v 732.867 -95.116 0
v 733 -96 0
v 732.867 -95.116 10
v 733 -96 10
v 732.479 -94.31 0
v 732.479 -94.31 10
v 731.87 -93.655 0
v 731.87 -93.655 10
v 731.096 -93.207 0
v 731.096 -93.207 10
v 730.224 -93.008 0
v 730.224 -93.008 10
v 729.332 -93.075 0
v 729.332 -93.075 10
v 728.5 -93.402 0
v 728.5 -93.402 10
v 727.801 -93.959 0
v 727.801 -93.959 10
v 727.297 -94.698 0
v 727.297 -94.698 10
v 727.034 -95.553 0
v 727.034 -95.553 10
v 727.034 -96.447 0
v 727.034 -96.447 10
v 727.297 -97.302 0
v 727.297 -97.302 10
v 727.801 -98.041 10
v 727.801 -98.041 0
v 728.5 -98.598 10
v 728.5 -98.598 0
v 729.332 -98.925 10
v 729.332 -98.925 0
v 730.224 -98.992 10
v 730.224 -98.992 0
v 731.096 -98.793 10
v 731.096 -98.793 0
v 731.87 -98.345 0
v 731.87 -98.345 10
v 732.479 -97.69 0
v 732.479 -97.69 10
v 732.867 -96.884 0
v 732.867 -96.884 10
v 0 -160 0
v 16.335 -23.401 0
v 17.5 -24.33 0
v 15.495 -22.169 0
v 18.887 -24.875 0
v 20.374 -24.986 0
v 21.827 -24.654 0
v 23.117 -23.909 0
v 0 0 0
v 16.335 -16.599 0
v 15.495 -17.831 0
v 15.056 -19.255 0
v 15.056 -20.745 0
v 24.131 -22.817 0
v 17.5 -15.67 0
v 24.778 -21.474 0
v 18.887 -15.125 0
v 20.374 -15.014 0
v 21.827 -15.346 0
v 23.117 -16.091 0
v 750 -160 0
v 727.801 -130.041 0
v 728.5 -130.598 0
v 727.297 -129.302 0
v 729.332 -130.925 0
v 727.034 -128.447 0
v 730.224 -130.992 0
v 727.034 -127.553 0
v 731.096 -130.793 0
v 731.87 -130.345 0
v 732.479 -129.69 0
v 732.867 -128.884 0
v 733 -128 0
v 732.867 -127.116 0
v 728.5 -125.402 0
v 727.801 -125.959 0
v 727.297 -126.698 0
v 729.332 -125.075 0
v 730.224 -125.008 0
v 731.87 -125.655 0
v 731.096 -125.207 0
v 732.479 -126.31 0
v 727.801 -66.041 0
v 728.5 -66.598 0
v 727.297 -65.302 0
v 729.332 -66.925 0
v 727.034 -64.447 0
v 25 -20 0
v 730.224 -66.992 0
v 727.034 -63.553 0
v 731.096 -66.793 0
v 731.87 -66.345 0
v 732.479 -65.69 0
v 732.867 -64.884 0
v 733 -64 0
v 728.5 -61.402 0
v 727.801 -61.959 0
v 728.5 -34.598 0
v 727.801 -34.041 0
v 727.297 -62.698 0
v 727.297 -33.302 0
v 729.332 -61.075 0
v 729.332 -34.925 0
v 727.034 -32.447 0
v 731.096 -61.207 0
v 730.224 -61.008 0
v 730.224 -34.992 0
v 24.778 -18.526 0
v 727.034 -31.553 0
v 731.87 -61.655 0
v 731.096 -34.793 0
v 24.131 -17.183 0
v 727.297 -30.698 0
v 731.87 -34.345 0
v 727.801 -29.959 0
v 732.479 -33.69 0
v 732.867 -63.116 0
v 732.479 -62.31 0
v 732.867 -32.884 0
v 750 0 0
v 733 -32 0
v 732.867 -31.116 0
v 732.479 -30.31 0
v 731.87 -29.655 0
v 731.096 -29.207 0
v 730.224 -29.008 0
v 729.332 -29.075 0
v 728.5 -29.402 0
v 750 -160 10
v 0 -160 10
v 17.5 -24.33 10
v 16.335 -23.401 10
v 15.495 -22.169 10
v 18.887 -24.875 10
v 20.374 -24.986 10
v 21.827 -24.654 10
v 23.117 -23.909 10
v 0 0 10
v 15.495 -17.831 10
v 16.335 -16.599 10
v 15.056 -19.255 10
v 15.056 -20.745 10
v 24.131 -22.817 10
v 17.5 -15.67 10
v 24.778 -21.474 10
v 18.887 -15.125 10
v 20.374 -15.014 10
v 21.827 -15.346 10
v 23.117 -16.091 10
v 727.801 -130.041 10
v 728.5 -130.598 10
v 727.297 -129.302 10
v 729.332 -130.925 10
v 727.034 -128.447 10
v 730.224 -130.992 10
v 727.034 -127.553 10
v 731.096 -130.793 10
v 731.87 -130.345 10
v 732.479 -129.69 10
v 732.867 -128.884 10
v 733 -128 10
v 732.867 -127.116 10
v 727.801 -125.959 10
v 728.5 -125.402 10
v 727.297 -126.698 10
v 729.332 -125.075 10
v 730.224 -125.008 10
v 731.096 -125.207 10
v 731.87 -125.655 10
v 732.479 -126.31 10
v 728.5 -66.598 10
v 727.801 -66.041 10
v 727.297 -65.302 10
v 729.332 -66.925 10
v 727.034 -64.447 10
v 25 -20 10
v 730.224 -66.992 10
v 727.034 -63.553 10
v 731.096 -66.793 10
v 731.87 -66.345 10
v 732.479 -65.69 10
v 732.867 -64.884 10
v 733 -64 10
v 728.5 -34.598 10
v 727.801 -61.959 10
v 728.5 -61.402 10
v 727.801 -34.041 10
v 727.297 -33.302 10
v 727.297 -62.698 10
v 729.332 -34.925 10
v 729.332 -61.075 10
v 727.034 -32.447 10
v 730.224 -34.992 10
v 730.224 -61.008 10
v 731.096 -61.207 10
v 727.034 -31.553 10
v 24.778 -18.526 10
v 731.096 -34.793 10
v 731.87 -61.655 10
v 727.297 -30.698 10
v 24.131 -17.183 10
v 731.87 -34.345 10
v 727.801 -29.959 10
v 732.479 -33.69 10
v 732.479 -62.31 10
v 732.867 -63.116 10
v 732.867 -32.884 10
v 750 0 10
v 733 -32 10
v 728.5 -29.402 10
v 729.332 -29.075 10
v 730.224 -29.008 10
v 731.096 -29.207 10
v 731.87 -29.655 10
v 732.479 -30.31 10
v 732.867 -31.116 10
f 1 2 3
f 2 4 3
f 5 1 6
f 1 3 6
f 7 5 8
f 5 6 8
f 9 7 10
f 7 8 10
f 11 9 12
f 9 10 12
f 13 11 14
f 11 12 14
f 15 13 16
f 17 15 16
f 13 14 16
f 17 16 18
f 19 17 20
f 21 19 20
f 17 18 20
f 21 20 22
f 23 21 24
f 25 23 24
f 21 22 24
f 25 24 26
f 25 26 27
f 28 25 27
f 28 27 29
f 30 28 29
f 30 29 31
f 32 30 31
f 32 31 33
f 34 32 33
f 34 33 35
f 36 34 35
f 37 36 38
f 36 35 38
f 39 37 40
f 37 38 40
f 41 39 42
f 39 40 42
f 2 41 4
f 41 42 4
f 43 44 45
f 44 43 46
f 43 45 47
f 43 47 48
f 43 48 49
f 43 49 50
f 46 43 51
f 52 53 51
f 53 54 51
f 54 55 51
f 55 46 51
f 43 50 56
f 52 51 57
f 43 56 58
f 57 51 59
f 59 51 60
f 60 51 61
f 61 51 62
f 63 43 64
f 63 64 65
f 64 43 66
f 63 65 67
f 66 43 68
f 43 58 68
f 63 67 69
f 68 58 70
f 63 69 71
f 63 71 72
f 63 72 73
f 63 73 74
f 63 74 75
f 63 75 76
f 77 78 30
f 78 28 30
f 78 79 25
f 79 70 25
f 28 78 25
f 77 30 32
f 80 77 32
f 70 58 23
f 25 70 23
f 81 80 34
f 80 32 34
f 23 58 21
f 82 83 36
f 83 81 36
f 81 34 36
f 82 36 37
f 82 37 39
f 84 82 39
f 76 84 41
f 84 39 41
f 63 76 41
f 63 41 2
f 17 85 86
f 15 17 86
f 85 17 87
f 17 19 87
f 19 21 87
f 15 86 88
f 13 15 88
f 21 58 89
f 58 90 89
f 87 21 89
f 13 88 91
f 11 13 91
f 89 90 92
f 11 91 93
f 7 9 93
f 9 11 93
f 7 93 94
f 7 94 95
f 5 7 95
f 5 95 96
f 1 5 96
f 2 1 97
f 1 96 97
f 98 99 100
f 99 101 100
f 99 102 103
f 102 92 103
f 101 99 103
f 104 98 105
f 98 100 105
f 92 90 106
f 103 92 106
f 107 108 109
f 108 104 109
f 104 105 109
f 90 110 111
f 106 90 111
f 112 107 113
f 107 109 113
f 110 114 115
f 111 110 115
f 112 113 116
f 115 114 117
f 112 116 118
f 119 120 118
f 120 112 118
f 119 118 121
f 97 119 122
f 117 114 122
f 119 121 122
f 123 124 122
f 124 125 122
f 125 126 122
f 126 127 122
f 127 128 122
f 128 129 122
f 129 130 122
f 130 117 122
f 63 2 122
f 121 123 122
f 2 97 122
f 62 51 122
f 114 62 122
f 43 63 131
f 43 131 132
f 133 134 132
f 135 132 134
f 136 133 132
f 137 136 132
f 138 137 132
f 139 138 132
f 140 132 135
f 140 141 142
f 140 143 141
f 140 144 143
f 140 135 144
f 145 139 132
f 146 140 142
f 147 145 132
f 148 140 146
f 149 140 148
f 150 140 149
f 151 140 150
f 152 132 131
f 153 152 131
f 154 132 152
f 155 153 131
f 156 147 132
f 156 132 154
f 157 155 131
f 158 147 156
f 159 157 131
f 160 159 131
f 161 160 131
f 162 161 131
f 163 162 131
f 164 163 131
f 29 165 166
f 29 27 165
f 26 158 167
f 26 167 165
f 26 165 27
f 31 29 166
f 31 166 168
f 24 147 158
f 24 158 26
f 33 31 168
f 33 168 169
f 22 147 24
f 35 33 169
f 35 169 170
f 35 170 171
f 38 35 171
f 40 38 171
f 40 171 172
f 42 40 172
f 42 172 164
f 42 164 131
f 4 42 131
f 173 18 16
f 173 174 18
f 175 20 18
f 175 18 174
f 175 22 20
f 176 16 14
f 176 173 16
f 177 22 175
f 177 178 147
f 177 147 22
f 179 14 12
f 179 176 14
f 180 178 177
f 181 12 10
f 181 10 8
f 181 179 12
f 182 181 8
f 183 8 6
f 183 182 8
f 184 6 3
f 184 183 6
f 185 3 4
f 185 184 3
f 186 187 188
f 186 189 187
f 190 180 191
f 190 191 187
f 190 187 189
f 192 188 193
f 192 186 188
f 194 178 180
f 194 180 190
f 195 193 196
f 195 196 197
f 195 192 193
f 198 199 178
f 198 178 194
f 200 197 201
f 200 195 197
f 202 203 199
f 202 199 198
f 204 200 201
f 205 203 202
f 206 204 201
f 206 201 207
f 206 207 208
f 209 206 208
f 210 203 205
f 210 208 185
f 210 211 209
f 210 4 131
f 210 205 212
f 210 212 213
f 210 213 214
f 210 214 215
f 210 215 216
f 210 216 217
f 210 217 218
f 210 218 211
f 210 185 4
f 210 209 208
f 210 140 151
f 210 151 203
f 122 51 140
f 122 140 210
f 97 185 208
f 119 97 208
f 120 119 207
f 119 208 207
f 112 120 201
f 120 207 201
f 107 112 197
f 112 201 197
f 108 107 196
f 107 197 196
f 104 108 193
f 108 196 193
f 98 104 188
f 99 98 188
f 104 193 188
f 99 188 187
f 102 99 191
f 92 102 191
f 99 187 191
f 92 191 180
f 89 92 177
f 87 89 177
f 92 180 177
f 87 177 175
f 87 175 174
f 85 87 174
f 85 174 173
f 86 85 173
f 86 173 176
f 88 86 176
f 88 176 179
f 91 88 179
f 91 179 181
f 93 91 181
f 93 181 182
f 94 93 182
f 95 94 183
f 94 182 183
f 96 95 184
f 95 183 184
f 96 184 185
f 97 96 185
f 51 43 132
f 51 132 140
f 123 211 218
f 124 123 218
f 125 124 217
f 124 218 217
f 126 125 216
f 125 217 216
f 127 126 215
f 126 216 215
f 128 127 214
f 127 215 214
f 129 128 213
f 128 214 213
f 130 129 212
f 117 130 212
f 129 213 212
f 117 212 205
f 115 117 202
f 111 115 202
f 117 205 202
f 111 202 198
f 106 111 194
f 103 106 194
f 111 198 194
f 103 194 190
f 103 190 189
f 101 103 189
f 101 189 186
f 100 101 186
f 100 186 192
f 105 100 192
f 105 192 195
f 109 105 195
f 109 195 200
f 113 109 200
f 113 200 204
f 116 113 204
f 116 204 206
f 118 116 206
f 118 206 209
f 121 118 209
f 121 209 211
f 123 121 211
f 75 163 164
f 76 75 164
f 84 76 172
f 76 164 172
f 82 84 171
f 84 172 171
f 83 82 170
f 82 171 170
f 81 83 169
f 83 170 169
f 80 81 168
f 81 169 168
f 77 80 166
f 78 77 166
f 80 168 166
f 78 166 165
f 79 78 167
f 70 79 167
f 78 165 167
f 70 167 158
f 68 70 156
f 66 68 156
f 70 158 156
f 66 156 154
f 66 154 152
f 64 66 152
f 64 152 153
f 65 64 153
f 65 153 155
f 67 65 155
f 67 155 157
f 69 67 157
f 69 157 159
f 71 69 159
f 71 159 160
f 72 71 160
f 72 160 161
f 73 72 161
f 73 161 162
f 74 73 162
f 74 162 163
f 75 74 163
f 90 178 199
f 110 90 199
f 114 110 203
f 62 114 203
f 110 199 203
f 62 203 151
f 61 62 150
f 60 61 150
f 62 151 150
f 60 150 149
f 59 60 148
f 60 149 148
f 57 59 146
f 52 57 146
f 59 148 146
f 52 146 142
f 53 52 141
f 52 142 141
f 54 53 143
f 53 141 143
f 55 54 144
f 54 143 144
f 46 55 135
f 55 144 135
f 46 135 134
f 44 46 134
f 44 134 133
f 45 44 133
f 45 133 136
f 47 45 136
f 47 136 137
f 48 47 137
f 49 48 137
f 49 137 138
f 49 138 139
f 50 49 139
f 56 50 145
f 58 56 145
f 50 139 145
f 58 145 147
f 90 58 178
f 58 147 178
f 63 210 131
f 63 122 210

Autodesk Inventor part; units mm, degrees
ref_plane "YZ Plane" through (0, 0, 0) normal (1, 0, 0) x (0, 1, 0)
ref_plane "XZ Plane" through (0, 0, 0) normal (0, 1, 0) x (-1, 0, 0)
ref_plane "XY Plane" through (0, 0, 0) normal (0, 0, 1) x (1, 0, 0)
sketch "Boceto1" plane through (0, 0, 0) normal (0, 0, 1) x (1, 0, 0)
  line L0 (0, 0) -> (750, 0)
  line L1 (750, 0) -> (750, -160)
  line L2 (750, -160) -> (0, -160)
  line L3 (0, -160) -> (0, 0)
  dimension "d0" = 750
  dimension "d1" = 160
extrude "Extrusión1" add sketch "Boceto1" along normal blind 10
sketch "Boceto2" plane through (0, 0, 10) normal (0, 0, 1) x (1, 0, 0)
  line L0 (750, 0) -> (0, 0) projected
  line L1 (0, 0) -> (40, 0)
  line L2 (40, 0) -> (40, -40)
  line L3 (40, -40) -> (0, -40)
  line L4 (0, -40) -> (0, 0)
  circle A0 centre (20, -20) radius 5
  dimension "d4" = 40
  dimension "d5" = 40
  dimension "d6" = 10
extrude "Extrusión2" cut sketch "Boceto2" against normal blind 10 contours A0
sketch "Boceto4" plane through (0, 0, 10) normal (0, 0, 1) x (1, 0, 0)
  line L0 (0, -160) -> (750, -160) projected
  line L1 (750, -160) -> (730, -160)
  line L2 (730, -160) -> (730, -128)
  line L3 (730, -128) -> (730, -96)
  line L4 (730, -96) -> (730, -64)
  line L5 (730, -64) -> (730, -32)
  circle A0 centre (730, -128) radius 3
  circle A1 centre (730, -96) radius 3
  circle A2 centre (730, -64) radius 3
  circle A3 centre (730, -32) radius 3
  point P0 (0, 0)
  dimension "d13" = 20
  dimension "d14" = 32
  dimension "d15" = 32
  dimension "d16" = 32
  dimension "d17" = 32
  dimension "d18" = 6
  dimension "d19" = 6
  dimension "d20" = 6
  dimension "d21" = 6
extrude "Extrusión4" cut sketch "Boceto4" against normal blind 10
properties part number "Tabla_movimiento" material "Plástico ABS"
